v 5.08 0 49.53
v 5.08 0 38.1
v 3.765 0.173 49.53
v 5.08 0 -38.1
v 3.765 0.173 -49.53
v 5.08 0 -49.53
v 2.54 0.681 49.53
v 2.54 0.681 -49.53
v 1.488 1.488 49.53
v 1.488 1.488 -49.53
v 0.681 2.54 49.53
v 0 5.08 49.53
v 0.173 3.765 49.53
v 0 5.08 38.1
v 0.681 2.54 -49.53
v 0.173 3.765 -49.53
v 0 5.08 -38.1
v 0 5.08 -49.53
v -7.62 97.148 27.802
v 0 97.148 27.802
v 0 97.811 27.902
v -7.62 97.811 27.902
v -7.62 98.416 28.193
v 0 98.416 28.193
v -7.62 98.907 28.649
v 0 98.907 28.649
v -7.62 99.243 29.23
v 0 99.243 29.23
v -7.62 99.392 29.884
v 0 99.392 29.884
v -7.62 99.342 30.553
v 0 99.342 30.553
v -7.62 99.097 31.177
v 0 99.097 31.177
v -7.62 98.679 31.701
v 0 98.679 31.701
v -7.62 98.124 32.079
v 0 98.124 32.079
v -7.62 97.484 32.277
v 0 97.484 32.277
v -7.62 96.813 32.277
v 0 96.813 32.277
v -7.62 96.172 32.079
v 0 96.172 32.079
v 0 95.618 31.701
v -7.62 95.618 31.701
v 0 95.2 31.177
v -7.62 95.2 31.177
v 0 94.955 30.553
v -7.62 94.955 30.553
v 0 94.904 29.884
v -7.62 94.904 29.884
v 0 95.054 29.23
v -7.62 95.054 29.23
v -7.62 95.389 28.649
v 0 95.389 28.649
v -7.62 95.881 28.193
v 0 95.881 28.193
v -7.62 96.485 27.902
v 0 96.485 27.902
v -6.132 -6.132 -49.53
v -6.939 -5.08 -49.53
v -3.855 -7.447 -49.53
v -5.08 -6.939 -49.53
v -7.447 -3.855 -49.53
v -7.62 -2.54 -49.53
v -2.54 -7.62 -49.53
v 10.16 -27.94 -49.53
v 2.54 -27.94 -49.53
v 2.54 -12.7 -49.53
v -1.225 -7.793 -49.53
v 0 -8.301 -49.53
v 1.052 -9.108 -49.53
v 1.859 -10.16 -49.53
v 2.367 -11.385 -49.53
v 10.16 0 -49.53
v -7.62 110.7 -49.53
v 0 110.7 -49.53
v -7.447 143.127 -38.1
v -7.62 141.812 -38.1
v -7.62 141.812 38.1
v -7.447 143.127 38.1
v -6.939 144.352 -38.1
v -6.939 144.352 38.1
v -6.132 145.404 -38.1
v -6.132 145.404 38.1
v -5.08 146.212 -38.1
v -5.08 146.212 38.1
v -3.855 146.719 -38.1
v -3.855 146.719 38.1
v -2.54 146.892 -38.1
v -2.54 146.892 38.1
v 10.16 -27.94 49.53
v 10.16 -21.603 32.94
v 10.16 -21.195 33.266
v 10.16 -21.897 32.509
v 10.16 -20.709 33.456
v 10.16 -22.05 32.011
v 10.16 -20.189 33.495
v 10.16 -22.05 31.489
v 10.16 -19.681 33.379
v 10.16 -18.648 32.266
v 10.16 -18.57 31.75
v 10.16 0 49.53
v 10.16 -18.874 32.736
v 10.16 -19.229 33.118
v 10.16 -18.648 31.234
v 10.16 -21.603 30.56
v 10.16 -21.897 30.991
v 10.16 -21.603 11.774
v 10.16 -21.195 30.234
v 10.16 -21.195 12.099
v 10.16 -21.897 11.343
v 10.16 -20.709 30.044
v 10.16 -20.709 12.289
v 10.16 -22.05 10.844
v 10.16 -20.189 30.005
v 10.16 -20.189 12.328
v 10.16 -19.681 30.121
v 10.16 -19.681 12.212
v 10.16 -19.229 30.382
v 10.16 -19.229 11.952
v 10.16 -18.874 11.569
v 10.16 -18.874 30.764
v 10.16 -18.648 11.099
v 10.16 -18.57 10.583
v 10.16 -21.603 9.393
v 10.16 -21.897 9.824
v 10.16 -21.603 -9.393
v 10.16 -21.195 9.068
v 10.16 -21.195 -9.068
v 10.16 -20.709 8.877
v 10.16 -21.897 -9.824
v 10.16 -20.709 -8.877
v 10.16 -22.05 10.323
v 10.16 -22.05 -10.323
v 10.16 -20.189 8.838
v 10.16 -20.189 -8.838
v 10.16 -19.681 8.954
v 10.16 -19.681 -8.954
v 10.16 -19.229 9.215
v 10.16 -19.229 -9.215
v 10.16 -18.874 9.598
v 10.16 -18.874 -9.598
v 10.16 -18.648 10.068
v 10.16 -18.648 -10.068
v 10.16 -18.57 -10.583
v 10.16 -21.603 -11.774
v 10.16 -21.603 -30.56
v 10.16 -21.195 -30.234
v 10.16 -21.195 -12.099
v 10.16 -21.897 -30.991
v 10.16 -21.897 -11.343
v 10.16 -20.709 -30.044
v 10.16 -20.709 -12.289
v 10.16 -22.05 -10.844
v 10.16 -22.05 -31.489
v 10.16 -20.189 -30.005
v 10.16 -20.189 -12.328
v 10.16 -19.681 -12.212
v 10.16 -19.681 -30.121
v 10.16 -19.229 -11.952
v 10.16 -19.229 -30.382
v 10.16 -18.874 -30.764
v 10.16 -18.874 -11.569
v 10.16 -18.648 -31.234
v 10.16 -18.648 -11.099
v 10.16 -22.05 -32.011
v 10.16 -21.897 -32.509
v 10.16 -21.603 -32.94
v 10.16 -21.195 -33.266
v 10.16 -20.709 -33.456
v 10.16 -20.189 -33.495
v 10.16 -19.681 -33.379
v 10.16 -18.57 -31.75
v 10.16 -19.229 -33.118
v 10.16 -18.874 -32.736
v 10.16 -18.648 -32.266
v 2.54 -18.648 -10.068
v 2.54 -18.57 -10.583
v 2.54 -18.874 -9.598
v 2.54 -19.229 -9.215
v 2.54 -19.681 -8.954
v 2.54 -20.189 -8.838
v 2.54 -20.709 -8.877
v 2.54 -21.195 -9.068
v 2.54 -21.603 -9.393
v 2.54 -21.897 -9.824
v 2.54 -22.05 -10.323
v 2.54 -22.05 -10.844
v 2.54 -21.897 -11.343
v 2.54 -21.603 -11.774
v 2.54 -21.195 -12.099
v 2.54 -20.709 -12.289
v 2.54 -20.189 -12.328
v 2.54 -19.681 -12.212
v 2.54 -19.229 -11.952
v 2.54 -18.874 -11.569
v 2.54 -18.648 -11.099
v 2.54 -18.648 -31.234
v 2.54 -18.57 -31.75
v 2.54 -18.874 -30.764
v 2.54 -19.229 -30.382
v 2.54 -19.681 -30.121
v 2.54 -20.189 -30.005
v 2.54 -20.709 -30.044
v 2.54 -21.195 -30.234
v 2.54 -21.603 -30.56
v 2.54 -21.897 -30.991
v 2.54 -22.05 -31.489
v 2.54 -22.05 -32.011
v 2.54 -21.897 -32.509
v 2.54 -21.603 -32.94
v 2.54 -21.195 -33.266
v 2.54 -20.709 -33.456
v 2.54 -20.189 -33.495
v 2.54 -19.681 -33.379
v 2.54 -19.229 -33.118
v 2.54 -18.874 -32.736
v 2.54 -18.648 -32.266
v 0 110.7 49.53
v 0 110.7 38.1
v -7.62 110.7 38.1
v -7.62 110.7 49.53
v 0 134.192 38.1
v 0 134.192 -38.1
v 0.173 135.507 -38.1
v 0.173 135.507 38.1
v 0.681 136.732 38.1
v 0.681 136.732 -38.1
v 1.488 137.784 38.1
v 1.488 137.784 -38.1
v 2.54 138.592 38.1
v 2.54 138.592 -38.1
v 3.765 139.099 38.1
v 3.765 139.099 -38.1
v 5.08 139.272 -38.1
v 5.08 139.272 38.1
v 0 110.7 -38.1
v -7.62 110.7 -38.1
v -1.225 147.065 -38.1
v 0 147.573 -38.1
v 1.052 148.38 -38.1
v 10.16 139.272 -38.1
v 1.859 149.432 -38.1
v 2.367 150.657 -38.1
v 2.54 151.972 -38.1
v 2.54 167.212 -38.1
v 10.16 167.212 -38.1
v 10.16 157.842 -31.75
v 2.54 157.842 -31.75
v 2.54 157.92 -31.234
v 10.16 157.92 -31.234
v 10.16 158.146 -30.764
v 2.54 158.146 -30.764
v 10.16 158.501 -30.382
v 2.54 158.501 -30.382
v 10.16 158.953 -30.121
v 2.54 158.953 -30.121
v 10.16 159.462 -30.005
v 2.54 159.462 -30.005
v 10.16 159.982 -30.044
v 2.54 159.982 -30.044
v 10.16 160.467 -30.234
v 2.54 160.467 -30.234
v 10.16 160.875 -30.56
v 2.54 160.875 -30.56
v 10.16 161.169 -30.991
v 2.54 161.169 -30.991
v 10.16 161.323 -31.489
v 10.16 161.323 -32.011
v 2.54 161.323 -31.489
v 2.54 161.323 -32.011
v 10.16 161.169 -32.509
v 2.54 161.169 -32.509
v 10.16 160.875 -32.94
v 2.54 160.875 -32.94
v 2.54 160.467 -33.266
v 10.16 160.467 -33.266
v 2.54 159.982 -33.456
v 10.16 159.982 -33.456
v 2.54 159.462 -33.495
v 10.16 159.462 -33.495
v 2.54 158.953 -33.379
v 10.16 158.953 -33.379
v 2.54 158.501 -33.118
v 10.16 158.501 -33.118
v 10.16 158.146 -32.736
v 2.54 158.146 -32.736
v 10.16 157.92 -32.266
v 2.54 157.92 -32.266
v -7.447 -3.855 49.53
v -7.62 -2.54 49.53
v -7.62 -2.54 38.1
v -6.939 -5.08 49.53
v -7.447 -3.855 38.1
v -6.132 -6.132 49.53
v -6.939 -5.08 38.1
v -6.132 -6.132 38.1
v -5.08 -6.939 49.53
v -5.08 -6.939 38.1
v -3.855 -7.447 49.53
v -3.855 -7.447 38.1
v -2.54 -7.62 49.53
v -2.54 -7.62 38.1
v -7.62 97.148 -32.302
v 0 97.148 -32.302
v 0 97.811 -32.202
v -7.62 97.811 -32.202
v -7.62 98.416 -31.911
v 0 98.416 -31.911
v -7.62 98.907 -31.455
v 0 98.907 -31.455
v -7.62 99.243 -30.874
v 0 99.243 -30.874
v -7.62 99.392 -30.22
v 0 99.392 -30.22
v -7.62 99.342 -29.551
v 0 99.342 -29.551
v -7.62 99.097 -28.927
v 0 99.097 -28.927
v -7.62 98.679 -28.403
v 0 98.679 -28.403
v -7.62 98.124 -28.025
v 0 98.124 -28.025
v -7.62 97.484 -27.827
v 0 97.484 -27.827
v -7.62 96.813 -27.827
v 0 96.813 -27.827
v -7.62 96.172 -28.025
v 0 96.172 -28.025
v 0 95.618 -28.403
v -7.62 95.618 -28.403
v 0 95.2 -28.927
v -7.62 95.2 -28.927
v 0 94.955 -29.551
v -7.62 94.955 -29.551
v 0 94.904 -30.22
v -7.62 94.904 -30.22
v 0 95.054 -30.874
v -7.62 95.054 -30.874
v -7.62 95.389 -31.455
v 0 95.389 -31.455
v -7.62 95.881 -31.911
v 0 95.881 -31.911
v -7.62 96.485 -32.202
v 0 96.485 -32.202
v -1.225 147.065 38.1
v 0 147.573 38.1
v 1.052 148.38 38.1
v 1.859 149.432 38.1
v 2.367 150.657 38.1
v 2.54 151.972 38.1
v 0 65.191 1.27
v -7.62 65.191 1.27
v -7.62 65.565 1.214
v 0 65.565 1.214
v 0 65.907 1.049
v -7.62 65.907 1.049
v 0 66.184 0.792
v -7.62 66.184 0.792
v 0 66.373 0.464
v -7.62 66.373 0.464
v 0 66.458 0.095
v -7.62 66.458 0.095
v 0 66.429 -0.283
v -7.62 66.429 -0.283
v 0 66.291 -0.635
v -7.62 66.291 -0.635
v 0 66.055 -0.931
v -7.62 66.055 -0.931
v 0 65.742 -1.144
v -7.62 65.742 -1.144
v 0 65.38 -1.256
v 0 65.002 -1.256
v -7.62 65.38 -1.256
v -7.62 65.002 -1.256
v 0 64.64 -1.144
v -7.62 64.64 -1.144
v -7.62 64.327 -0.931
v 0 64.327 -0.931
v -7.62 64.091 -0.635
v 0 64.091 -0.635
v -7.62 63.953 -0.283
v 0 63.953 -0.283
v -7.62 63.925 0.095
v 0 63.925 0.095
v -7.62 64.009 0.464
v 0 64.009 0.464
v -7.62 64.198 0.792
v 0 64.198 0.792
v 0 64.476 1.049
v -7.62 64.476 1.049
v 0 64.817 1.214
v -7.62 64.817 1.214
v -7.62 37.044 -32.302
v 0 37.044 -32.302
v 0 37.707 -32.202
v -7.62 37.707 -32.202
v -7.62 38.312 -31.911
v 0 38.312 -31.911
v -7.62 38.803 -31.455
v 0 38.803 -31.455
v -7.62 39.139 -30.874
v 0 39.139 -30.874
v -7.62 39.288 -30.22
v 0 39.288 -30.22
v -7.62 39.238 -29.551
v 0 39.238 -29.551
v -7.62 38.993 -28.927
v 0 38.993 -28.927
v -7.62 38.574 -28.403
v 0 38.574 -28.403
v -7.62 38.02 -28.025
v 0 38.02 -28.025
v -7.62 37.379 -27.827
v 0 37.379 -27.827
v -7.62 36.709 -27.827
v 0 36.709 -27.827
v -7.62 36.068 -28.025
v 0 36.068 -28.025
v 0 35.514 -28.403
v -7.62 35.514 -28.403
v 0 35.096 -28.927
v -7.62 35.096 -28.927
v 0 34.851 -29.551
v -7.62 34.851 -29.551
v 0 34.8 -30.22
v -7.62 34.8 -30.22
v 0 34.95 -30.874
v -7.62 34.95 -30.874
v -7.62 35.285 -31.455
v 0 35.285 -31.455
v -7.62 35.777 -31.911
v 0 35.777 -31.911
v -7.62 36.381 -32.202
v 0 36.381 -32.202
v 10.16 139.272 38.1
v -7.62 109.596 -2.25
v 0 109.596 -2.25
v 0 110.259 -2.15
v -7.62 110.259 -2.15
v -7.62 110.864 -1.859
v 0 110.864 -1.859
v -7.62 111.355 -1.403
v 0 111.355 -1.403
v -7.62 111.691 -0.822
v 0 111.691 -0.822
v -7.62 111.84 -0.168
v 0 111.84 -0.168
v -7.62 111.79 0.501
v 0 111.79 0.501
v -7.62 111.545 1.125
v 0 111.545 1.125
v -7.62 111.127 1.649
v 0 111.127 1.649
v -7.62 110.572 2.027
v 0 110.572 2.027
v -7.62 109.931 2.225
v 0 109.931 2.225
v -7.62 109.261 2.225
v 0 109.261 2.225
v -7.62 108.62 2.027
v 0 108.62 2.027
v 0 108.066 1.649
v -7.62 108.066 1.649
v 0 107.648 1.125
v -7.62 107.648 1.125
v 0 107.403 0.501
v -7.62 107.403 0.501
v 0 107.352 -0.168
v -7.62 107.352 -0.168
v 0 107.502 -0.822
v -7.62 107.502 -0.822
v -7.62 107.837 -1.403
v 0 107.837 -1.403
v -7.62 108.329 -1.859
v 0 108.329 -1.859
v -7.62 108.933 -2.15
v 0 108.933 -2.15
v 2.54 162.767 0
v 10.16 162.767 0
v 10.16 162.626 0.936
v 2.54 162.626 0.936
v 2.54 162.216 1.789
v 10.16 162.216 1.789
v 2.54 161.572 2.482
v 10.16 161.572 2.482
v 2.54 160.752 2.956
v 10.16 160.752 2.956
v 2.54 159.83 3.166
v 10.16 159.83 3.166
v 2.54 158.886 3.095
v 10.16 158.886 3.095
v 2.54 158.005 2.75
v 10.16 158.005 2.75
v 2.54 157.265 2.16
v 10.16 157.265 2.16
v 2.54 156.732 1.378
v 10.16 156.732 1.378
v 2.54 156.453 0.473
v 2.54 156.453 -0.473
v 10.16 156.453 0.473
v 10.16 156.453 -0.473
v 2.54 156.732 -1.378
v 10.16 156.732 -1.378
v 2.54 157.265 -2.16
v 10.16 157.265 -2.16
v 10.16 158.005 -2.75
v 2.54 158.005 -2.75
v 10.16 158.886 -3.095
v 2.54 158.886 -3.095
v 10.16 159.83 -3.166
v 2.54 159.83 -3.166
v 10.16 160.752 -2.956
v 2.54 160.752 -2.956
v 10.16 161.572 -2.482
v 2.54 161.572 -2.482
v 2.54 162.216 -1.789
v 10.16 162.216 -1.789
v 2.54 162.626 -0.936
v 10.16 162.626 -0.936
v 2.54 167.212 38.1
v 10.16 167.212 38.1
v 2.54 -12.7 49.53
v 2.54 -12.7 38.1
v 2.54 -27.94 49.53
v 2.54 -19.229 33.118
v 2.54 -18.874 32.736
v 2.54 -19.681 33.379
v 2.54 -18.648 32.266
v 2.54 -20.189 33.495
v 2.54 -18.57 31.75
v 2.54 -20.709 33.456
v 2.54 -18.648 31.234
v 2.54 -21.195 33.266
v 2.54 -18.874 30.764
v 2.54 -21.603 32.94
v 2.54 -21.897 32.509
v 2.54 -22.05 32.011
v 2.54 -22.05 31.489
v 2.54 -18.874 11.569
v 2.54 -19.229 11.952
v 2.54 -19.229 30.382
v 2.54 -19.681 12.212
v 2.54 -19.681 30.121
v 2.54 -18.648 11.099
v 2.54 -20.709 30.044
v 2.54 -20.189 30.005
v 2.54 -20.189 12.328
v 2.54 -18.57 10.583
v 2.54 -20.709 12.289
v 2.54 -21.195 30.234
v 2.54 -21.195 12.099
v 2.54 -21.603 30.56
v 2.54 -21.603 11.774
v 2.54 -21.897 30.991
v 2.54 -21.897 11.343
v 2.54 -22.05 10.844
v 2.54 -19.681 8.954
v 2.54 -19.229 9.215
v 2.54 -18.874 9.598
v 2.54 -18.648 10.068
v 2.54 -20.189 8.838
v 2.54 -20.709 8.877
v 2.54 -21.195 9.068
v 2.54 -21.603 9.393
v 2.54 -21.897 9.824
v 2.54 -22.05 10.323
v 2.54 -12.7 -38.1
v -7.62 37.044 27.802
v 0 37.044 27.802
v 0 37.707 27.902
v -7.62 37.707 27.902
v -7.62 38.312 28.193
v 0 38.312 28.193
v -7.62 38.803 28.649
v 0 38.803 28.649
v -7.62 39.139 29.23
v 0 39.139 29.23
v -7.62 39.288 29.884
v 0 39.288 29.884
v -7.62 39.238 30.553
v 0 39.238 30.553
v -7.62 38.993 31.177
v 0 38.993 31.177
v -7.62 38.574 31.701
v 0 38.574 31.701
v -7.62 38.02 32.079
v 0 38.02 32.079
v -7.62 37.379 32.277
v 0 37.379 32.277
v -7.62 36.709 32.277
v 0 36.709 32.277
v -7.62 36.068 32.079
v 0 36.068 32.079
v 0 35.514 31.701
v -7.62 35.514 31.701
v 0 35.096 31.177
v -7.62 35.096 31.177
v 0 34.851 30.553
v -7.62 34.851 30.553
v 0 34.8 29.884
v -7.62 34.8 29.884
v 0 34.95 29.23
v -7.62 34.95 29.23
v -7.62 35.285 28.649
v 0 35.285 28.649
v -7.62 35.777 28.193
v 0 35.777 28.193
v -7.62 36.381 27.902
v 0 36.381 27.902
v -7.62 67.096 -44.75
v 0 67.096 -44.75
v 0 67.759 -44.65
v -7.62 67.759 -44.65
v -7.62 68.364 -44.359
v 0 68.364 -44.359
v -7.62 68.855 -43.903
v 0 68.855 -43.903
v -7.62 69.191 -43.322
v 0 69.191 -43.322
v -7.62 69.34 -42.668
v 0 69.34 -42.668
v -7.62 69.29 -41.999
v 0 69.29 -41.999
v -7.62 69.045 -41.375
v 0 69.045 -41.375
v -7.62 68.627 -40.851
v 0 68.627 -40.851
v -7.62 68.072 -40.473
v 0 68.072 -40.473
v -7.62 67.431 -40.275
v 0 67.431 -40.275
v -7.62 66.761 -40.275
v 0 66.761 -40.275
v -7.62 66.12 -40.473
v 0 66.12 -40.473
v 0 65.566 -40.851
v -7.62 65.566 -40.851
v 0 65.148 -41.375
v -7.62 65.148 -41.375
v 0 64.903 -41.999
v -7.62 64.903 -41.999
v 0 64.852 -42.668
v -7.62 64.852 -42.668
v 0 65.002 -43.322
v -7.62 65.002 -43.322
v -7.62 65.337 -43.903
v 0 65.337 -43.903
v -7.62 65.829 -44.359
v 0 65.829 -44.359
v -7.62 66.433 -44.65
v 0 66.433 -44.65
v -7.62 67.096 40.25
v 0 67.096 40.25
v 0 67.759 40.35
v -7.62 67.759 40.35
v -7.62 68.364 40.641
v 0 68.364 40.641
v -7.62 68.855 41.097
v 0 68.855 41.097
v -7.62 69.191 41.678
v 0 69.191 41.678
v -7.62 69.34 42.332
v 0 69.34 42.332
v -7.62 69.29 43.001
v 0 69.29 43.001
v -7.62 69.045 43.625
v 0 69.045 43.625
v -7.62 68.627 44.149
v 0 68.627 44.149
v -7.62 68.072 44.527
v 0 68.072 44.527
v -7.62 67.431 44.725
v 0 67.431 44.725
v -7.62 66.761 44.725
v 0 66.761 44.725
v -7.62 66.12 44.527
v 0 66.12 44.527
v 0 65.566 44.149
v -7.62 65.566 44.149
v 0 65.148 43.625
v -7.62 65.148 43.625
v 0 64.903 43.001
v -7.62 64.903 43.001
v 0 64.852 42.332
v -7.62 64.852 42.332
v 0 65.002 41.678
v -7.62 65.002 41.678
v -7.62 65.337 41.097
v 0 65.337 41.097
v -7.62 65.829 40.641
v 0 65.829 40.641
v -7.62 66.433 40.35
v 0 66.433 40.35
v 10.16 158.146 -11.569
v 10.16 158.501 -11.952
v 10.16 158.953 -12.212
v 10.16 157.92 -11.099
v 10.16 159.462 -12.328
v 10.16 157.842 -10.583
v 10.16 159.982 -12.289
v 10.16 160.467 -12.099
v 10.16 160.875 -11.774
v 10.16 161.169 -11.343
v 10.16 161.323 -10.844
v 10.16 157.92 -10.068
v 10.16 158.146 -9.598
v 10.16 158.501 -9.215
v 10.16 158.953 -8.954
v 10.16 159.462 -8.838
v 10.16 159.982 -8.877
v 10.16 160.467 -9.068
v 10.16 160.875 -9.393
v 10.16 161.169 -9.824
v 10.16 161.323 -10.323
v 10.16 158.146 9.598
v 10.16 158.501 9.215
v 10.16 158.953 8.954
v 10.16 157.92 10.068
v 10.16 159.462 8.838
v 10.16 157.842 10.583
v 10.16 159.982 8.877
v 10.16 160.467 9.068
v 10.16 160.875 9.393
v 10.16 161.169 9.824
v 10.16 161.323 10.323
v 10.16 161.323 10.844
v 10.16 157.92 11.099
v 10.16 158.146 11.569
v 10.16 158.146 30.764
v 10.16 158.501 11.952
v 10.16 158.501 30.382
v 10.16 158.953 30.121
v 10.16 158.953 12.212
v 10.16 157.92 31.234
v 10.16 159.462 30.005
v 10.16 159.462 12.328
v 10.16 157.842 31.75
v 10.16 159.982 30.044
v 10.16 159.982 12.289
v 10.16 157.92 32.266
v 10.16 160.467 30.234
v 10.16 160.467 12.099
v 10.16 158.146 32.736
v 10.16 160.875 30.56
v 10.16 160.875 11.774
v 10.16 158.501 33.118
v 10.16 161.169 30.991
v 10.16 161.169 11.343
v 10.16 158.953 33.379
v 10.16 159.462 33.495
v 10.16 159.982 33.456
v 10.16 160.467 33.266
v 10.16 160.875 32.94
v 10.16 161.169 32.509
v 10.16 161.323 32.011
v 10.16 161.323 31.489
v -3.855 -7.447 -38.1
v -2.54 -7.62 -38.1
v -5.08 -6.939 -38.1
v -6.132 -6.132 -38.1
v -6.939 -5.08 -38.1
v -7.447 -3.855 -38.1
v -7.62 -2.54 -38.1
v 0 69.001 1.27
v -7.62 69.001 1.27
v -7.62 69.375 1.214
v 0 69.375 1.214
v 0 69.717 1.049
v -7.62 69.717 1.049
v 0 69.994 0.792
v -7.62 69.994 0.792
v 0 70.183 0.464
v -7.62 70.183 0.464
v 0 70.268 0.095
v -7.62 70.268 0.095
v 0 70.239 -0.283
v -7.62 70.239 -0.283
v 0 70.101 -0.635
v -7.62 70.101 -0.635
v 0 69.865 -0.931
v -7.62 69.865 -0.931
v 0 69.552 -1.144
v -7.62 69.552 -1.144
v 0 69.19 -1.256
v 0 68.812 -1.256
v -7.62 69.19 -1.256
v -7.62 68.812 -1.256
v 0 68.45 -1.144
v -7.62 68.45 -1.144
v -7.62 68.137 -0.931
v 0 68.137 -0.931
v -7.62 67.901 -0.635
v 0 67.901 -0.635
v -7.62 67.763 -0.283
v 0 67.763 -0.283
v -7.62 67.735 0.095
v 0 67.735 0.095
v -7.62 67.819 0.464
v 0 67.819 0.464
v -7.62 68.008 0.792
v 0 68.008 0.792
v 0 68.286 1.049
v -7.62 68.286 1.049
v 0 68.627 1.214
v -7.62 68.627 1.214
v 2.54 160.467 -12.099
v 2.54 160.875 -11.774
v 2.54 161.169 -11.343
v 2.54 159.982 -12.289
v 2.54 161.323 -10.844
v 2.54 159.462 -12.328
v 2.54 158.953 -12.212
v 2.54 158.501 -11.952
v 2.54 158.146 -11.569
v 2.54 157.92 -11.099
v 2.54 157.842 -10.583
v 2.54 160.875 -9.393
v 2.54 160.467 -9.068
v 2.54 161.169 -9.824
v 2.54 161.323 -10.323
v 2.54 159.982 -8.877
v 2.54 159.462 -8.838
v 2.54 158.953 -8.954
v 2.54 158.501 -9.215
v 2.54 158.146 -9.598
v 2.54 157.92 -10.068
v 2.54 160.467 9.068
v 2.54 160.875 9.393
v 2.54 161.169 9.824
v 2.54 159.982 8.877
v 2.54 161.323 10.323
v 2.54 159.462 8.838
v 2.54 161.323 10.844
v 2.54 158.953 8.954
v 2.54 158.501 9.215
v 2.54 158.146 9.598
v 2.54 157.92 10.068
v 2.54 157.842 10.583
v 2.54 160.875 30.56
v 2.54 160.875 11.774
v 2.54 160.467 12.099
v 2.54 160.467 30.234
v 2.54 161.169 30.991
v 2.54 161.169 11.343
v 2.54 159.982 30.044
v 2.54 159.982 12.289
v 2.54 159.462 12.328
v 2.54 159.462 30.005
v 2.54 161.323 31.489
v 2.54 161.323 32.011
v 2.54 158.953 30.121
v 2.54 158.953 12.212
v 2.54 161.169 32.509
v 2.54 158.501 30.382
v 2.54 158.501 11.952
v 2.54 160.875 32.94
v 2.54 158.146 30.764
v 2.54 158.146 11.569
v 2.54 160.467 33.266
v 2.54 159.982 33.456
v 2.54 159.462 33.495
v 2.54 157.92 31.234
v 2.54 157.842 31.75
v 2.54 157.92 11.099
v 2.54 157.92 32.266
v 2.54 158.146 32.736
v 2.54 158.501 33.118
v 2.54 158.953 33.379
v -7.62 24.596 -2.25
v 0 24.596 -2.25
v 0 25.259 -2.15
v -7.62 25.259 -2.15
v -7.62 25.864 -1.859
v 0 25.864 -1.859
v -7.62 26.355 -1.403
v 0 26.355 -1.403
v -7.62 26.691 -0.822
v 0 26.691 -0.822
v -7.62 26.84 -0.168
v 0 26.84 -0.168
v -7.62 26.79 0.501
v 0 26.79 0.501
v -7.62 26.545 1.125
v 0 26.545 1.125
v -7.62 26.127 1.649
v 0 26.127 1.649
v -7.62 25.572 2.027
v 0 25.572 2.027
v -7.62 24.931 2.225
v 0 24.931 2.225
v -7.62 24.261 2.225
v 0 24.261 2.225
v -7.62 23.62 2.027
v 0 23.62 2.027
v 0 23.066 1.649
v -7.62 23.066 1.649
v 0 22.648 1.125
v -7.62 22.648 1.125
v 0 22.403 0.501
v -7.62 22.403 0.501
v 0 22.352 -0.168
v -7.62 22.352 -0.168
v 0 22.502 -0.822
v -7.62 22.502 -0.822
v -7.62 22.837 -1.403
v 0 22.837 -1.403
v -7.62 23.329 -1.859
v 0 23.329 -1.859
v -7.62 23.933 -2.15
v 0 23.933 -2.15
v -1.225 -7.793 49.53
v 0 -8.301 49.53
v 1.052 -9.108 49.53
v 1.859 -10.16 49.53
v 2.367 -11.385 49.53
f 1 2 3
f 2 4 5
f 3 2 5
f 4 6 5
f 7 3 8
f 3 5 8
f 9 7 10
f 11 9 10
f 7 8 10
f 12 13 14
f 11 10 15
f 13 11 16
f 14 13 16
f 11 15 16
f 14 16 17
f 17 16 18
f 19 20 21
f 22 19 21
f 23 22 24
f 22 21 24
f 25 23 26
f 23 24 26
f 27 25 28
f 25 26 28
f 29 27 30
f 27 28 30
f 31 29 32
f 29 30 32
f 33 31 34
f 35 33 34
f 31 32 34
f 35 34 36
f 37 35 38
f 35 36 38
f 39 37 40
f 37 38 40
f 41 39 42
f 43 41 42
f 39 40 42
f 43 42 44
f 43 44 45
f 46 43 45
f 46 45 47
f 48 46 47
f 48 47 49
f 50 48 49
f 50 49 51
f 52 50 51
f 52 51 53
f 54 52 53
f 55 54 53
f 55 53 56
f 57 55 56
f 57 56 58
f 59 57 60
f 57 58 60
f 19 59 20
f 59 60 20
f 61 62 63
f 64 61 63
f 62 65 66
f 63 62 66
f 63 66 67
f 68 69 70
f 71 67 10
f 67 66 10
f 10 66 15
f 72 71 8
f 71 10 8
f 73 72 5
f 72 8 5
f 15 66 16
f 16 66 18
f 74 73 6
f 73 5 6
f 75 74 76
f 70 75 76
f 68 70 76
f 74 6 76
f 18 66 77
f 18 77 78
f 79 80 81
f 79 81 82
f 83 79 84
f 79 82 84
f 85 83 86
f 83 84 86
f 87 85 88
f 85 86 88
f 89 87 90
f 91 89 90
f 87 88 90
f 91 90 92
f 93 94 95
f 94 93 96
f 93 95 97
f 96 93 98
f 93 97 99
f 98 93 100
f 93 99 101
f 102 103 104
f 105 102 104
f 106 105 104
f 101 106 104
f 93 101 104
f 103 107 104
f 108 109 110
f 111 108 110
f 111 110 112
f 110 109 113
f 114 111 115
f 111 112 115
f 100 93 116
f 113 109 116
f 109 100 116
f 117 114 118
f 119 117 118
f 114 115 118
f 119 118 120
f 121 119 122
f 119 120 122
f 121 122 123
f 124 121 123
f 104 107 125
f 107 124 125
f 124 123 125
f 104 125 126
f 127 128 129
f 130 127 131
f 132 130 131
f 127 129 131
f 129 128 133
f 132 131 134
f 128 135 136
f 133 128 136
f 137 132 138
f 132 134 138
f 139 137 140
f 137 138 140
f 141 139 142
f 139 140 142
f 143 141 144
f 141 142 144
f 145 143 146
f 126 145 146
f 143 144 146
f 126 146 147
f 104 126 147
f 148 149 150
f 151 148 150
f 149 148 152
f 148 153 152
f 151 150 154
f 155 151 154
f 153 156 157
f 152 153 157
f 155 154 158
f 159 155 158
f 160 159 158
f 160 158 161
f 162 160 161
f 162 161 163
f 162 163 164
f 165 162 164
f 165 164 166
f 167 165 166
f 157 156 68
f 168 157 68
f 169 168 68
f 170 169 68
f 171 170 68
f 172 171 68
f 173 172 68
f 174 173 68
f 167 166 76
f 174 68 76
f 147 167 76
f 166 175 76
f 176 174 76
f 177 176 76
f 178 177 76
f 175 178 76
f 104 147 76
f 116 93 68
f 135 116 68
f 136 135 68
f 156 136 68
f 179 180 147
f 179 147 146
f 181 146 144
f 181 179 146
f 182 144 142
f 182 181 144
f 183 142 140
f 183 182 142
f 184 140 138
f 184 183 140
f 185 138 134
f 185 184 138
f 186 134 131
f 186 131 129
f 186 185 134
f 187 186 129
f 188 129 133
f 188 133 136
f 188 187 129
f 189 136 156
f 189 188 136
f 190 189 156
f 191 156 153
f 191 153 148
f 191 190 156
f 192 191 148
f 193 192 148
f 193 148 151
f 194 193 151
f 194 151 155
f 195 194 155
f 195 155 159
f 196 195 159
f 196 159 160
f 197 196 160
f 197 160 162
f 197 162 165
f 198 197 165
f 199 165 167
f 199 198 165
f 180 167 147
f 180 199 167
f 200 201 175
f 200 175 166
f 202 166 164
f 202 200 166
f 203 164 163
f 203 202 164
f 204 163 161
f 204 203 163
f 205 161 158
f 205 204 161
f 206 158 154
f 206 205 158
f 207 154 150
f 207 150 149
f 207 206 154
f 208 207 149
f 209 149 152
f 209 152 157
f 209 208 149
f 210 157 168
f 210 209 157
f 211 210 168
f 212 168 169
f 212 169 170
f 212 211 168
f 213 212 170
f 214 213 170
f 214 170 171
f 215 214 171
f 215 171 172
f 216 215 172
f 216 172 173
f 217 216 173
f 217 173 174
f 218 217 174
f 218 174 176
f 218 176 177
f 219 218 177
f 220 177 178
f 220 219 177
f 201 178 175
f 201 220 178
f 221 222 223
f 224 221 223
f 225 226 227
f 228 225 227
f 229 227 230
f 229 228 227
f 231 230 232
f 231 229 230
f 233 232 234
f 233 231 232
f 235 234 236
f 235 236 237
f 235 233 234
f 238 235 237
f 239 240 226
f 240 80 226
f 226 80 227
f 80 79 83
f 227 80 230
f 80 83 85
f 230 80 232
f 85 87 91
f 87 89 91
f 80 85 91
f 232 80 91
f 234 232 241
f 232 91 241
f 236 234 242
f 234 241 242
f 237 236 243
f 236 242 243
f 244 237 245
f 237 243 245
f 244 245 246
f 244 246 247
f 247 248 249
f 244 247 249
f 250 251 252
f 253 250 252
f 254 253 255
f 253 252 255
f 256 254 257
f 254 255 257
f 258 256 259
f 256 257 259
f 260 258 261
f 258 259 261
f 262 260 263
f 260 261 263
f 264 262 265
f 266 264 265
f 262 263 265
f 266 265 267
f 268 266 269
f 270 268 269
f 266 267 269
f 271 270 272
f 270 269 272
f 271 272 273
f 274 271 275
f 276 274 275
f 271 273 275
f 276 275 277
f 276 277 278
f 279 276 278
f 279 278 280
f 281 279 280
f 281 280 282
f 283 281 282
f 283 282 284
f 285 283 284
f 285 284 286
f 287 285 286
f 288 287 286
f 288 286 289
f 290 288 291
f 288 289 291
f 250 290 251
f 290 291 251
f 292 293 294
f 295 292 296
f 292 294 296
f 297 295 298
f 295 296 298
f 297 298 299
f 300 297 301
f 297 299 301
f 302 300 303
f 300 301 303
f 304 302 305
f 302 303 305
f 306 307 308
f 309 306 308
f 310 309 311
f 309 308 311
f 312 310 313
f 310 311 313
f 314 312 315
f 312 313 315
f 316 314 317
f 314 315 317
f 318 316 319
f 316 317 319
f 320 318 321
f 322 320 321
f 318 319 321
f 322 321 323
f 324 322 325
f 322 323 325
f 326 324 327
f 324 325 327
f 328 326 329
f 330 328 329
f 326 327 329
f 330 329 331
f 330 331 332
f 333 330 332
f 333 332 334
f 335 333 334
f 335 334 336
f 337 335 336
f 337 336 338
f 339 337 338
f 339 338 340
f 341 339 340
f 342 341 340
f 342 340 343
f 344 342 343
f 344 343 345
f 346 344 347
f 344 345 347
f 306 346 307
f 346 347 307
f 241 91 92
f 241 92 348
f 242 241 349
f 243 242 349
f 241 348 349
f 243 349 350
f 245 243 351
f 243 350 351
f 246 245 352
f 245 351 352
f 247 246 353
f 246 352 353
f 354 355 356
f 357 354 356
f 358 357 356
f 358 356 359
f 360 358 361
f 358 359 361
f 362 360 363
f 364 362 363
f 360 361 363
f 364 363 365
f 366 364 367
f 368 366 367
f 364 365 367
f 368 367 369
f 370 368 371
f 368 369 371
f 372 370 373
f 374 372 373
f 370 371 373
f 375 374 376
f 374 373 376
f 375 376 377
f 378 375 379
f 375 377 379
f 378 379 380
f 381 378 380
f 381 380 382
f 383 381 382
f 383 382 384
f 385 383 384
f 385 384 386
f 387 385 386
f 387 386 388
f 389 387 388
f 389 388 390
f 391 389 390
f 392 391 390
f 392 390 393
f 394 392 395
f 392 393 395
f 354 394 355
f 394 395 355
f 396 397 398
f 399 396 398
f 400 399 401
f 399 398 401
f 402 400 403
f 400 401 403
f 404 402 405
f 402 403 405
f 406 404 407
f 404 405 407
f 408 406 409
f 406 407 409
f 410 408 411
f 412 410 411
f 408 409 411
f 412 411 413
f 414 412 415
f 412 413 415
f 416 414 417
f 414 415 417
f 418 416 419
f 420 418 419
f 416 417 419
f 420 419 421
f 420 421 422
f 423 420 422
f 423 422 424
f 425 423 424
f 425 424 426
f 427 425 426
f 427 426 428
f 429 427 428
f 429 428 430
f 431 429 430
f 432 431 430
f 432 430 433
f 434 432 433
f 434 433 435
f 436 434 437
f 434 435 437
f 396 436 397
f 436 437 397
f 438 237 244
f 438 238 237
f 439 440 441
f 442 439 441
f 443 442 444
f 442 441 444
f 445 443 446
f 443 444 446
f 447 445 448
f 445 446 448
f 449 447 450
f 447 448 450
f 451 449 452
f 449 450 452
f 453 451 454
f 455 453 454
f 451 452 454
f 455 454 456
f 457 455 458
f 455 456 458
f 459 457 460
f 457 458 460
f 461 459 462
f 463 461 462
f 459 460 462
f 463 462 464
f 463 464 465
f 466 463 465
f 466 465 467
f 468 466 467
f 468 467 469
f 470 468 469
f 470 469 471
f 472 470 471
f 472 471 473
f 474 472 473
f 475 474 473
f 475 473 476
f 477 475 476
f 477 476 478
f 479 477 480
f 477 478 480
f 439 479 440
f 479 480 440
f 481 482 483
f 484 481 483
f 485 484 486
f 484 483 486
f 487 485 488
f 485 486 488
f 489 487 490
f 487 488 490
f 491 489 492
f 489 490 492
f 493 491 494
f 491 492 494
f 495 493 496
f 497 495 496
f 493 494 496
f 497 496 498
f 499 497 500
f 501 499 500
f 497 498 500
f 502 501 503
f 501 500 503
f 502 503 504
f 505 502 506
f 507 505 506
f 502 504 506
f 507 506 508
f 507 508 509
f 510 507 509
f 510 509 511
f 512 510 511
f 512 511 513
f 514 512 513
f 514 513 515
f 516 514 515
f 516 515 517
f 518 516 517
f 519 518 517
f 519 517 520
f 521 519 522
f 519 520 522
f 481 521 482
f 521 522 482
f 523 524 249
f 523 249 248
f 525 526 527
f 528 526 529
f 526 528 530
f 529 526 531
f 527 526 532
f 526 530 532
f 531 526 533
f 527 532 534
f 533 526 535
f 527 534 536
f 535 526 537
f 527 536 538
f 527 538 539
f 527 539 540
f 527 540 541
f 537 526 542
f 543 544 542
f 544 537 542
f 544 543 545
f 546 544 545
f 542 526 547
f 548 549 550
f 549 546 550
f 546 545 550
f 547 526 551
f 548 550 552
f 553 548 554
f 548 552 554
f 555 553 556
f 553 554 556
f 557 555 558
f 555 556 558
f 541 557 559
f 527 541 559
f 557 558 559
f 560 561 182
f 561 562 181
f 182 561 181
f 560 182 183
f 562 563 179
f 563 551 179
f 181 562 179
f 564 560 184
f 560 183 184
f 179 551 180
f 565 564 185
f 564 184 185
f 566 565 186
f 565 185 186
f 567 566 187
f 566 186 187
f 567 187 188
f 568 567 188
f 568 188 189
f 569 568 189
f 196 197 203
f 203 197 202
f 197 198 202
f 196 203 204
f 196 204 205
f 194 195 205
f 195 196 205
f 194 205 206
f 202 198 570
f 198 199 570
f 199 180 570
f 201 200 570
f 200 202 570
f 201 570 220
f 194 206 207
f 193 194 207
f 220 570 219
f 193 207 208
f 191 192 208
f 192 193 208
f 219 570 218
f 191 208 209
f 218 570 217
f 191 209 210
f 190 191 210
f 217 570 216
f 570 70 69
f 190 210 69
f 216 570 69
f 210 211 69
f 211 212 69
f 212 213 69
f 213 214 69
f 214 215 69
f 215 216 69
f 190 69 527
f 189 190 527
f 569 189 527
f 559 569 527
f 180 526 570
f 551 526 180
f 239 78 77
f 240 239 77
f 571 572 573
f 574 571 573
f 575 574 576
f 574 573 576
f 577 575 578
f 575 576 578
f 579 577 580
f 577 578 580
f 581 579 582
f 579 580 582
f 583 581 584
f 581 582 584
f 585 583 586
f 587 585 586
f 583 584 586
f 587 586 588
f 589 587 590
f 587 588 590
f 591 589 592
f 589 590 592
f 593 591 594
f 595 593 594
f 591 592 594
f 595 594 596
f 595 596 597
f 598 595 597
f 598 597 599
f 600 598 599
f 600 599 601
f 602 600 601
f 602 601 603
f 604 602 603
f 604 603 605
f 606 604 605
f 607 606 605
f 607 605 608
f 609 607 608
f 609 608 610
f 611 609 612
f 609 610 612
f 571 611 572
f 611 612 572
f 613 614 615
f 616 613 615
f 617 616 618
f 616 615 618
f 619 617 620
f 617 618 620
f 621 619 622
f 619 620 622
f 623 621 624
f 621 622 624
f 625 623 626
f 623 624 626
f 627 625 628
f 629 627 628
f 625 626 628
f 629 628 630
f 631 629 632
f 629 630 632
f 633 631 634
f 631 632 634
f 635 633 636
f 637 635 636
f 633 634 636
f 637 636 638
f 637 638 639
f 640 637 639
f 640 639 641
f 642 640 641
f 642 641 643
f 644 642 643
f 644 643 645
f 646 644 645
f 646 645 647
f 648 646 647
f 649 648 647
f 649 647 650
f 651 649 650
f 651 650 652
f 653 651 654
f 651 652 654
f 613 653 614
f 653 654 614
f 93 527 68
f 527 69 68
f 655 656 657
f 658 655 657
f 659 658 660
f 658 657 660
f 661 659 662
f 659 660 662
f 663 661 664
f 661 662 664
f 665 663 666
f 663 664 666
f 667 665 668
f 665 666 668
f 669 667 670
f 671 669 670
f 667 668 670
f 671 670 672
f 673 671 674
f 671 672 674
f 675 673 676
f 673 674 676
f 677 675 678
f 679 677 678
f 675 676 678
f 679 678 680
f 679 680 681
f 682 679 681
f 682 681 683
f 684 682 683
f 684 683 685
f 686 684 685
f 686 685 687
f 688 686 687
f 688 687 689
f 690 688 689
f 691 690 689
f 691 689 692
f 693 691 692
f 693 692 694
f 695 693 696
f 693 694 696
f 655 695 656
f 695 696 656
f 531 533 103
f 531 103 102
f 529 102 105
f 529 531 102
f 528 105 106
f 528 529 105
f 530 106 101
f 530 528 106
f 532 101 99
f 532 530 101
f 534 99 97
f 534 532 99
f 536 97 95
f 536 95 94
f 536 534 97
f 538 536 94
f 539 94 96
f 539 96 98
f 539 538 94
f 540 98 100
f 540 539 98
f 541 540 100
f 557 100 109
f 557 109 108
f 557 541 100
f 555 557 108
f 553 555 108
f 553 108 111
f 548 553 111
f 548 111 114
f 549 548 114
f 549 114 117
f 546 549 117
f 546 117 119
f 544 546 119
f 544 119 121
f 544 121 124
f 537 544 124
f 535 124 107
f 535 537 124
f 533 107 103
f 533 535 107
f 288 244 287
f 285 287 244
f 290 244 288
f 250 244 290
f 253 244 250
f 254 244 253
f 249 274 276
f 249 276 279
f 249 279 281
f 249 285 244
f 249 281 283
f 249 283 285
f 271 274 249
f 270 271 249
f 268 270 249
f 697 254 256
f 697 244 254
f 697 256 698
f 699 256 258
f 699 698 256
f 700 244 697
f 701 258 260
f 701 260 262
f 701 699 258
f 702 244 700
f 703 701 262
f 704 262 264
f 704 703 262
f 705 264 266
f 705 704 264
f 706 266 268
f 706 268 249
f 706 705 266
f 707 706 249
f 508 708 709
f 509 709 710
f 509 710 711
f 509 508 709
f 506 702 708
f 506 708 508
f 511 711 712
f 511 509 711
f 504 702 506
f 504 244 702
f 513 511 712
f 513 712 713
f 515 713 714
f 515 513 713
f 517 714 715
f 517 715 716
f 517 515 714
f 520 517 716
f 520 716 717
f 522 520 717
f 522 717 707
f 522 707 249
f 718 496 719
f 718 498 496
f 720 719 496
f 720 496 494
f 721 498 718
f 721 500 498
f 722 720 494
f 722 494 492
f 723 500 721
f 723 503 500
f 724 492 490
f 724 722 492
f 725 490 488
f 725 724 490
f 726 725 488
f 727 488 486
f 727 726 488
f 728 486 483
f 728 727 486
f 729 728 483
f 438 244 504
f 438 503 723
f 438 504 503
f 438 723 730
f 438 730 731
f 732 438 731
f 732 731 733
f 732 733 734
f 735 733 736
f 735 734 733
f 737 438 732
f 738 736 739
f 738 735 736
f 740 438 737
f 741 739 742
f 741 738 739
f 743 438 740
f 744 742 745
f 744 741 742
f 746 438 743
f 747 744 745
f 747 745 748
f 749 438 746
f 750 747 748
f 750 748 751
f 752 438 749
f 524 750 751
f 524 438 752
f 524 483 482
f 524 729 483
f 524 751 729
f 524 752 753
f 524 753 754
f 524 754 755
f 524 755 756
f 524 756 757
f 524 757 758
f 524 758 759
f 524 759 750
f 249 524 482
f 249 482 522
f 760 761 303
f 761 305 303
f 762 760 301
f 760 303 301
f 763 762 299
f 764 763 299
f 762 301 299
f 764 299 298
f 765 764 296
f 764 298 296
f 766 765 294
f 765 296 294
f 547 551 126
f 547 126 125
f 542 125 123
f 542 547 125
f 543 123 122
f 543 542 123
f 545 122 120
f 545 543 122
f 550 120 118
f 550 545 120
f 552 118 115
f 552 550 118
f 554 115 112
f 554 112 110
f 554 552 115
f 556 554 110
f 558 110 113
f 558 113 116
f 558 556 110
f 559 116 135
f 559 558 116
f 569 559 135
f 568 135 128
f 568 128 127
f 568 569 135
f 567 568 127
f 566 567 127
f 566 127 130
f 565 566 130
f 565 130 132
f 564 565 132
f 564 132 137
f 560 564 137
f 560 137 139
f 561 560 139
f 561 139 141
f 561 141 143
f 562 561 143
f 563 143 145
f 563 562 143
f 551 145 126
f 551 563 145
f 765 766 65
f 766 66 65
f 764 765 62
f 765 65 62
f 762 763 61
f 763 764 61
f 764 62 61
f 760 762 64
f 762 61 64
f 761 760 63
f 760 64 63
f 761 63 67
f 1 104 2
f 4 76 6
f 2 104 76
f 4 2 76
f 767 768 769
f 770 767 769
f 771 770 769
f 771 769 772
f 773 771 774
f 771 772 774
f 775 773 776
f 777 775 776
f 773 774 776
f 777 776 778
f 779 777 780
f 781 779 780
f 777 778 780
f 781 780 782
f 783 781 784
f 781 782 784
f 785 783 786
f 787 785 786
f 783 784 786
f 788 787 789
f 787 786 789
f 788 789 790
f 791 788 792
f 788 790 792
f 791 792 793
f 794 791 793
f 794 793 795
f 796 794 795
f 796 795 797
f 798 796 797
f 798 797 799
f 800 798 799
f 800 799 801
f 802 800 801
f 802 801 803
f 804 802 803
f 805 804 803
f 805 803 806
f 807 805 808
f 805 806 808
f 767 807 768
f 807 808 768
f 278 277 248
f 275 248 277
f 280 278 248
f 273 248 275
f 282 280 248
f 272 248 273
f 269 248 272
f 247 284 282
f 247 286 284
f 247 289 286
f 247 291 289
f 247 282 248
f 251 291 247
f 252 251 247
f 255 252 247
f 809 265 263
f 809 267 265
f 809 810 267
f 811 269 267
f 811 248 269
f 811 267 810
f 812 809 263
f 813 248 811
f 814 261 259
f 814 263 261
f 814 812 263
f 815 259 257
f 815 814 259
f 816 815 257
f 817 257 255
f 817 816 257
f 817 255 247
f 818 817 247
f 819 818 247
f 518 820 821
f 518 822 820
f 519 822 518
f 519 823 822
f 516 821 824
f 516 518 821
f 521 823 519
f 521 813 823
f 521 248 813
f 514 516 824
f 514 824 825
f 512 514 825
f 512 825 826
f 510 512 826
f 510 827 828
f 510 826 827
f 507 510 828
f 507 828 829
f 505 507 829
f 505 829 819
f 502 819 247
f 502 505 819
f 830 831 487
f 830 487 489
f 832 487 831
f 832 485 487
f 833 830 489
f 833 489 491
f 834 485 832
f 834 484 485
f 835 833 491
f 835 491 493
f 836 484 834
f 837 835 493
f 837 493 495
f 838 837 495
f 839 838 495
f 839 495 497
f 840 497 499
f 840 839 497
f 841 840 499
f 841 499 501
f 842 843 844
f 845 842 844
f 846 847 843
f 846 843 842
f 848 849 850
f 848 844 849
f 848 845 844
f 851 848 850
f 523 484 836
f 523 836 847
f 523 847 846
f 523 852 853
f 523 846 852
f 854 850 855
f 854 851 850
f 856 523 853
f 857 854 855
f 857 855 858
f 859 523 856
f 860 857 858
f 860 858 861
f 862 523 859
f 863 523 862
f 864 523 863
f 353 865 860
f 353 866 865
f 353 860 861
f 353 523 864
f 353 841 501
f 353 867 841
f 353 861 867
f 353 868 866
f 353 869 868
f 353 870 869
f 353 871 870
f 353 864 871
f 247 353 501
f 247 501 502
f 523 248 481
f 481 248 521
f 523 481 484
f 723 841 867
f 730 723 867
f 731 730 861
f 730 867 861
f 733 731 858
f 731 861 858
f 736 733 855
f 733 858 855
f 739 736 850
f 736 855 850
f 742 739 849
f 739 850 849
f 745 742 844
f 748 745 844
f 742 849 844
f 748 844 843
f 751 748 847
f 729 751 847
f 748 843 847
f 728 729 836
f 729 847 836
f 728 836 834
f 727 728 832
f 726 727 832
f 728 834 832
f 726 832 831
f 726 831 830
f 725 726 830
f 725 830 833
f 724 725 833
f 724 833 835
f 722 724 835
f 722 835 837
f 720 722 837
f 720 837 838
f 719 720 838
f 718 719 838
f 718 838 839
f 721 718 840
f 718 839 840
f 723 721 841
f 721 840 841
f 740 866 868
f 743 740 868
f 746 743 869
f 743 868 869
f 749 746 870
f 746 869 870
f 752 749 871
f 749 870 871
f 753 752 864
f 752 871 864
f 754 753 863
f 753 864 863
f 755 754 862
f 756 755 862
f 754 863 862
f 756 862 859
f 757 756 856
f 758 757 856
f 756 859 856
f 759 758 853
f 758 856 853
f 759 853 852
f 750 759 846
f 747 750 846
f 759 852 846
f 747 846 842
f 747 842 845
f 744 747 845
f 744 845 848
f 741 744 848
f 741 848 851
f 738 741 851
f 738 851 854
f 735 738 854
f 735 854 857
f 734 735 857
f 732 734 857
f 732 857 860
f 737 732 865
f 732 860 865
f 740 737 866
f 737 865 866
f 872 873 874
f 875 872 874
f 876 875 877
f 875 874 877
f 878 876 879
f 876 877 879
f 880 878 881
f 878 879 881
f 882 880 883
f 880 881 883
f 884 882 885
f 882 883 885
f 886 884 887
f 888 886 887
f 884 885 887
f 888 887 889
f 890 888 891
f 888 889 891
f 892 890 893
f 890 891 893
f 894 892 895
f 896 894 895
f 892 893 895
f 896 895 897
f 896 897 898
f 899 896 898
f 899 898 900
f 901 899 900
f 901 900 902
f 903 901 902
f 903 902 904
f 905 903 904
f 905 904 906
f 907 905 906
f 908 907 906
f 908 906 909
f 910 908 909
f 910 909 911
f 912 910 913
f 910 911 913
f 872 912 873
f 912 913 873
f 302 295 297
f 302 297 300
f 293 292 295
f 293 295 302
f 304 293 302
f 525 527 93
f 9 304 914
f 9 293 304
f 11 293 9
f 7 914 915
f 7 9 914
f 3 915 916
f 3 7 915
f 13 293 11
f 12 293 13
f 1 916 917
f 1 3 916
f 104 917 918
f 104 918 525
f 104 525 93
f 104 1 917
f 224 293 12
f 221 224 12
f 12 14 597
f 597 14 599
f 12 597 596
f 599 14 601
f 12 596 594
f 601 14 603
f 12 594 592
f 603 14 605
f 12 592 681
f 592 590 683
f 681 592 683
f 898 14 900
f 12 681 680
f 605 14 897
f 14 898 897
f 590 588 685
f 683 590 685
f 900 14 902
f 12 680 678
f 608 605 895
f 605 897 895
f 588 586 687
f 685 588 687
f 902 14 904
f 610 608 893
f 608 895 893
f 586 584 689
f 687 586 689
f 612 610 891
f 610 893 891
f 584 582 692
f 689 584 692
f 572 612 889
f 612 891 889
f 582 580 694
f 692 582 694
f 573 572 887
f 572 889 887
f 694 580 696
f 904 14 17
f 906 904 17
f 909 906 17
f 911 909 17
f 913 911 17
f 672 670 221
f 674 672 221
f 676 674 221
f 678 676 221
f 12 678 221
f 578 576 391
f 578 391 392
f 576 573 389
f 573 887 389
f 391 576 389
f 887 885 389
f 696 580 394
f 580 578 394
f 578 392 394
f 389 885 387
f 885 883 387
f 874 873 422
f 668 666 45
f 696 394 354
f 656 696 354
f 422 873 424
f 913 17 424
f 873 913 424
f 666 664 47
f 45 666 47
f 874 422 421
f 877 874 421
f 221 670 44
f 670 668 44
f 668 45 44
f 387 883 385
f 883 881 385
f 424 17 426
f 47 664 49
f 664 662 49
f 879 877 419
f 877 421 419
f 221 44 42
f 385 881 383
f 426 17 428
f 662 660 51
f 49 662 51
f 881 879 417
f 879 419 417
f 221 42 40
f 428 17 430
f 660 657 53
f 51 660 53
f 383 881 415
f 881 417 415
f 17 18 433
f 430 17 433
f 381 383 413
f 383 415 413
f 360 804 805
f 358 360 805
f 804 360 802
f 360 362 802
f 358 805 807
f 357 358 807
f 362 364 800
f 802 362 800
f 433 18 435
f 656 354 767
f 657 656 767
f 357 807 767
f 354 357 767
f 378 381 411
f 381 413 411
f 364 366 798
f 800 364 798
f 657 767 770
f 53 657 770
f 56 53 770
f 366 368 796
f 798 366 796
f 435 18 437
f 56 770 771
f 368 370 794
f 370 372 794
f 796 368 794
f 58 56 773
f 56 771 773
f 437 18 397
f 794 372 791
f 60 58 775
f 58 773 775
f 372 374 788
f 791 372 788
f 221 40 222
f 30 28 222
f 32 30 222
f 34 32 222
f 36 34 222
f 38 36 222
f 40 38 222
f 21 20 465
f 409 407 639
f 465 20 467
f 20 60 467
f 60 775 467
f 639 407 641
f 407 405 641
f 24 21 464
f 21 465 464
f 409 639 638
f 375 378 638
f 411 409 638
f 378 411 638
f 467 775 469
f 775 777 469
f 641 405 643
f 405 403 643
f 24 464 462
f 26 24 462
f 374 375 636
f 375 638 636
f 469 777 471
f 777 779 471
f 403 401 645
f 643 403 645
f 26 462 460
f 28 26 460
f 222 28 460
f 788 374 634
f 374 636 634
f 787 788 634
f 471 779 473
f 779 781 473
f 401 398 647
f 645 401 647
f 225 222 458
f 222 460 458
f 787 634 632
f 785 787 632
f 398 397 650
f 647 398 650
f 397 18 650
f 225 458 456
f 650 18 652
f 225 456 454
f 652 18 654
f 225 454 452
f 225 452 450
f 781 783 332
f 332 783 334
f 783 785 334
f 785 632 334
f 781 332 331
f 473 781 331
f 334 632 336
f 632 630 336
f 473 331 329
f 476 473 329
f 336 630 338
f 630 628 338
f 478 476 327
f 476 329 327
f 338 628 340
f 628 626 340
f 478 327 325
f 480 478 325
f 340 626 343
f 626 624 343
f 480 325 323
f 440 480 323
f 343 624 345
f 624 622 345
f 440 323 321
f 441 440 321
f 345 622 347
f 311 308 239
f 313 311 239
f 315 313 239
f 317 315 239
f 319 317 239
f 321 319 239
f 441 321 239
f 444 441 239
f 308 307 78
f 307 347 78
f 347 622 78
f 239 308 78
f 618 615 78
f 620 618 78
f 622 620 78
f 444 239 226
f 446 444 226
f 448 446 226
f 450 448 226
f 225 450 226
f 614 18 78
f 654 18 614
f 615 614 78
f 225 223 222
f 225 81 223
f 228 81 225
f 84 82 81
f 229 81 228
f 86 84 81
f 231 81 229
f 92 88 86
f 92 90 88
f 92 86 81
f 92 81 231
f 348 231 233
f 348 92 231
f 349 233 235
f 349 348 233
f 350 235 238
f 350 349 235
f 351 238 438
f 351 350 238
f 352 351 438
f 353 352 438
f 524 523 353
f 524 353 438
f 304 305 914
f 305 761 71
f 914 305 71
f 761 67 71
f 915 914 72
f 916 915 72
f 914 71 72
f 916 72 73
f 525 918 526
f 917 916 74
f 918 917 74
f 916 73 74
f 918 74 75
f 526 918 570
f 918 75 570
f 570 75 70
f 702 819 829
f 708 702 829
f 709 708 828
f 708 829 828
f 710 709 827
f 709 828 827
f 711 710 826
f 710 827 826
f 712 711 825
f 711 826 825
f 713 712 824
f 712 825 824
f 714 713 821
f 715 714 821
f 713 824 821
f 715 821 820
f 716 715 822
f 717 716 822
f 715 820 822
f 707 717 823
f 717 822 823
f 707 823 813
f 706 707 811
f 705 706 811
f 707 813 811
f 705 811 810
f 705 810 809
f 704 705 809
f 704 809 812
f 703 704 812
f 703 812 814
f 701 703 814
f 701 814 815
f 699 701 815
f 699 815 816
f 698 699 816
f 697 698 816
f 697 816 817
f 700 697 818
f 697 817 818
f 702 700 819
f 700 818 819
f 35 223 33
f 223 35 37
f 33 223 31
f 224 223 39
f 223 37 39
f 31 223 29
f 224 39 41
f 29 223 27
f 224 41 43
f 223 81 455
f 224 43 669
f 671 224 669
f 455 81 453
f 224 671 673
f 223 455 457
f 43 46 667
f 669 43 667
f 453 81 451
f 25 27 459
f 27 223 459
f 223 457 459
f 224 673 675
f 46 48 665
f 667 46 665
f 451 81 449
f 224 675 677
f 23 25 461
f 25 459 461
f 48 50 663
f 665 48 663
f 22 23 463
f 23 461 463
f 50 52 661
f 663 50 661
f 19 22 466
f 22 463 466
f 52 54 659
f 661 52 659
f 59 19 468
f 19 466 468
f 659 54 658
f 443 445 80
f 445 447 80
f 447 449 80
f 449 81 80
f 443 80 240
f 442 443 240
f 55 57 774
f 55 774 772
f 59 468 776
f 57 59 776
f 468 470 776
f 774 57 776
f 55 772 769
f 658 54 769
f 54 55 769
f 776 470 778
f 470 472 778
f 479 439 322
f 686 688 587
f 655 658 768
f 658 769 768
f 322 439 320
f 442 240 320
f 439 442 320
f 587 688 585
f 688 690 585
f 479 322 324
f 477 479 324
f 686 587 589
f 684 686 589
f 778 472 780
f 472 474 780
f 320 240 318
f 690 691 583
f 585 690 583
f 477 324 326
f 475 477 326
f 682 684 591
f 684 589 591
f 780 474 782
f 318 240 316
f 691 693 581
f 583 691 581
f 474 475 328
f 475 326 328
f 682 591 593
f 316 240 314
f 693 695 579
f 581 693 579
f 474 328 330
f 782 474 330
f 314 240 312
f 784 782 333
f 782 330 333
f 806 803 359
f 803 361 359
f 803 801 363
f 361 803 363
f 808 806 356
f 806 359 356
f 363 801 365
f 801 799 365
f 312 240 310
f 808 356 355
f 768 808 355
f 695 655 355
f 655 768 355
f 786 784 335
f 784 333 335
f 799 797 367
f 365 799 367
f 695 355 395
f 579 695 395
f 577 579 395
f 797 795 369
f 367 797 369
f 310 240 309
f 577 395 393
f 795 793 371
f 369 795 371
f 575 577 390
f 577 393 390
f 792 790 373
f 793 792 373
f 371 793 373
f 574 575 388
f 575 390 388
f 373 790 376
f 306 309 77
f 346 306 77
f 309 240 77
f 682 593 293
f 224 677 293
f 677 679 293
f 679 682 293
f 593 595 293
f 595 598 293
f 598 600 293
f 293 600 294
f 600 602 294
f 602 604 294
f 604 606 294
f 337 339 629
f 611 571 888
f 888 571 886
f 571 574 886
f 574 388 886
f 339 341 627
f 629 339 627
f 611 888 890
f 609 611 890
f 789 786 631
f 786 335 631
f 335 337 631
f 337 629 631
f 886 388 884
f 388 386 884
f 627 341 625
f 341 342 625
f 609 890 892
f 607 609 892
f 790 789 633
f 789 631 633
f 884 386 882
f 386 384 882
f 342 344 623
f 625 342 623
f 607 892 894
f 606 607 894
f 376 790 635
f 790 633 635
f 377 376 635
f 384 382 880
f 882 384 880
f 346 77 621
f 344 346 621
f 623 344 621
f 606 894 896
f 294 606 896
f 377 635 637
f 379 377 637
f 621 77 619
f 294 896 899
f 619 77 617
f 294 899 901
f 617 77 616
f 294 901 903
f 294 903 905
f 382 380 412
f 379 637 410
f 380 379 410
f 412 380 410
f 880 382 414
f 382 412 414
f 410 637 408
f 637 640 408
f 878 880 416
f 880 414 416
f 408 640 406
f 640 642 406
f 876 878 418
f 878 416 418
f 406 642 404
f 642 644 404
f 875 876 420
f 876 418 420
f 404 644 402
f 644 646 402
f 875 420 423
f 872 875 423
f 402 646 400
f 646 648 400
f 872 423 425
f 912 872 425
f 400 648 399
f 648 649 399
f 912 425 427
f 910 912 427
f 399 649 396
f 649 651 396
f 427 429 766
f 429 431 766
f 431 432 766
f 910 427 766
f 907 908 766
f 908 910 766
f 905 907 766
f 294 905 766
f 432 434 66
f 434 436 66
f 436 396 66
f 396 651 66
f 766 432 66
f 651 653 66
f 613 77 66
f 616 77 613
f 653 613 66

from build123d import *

# Parameters (mm, degrees)
BOSS_EXTRUDE1_DEPTH = 38.1
FILLET1_R           = 5.08
BOSS_EXTRUDE2_DEPTH = 49.53
SKETCH7_R           = 2.25
CUT_EXTRUDE1_DEPTH  = 7.62
SKETCH8_R           = 1.75
CUT_EXTRUDE2_DEPTH  = 7.62
SKETCH10_R          = 3.175
CGTEST1_DEPTH       = 7.62
SKETCH11_R          = 1.27
CUT_EXTRUDE4_DEPTH  = 7.62


with BuildPart() as part:
    # Sketch1 → Boss-Extrude1 (new, symmetric)
    with BuildSketch(Plane.XY):
        Polygon((0, 0), (0, 139.272298857), (10.16, 139.272298857), (10.16, 146.892298857), (10.16, 167.212298857), (2.54, 167.212298857), (2.54, 146.892298857), (-7.62, 146.892298857), (-7.62, 139.272298857), (-7.62, -7.62), (2.54, -7.62), (2.54, -27.94), (10.16, -27.94), (10.16, -7.62), (10.16, 0), align=None)
    extrude(amount=BOSS_EXTRUDE1_DEPTH, both=True)

    # Fillet1
    fillet1_edges = [part.edges().sort_by_distance(p)[0] for p in [
        (0, 0, 0),
        (2.54, -7.62, 0),
        (0, 139.272298857, 0),
        (2.54, 146.892298857, 0),
        (-7.62, 146.892298857, 0),
        (-7.62, -7.62, 0),
    ]]
    fillet(fillet1_edges, radius=FILLET1_R - 0.0001)  # a hair under: the kernel refuses the full size

    # Sketch3 → Boss-Extrude2 (add, symmetric)
    with BuildSketch(Plane(origin=(0, 0, 0), x_dir=(-1, 0, 0), z_dir=(0, 0, -1))):
        with BuildLine():
            Line((0, 110.7), (7.62, 110.7))
            Line((7.62, 110.7), (7.62, -2.54))
            ThreePointArc((7.62, -2.54), (6.132102448, -6.132102448), (2.54, -7.62))
            ThreePointArc((2.54, -7.62), (-1.052102448, -9.107897552), (-2.54, -12.7))
            Line((-2.54, -12.7), (-2.54, -27.94))
            Line((-2.54, -27.94), (-10.16, -27.94))
            Line((-10.16, -27.94), (-10.16, 0))
            Line((-10.16, 0), (-5.08, 0))
            ThreePointArc((-5.08, 0), (-1.487897552, 1.487897552), (0, 5.08))
            Line((0, 5.08), (0, 110.7))
        make_face()
    extrude(amount=BOSS_EXTRUDE2_DEPTH, both=True)

    # Sketch7 → Cut-Extrude1 (cut)
    with BuildSketch(Plane(origin=(0, 0, 0), x_dir=(0, 0, -1), z_dir=(1, 0, 0))):
        with Locations((-42.5, 67.096149428)):
            Circle(SKETCH7_R)
        with Locations((-30.0520382, 97.148187629)):
            Circle(SKETCH7_R)
        with Locations((0, 109.596149428)):
            Circle(SKETCH7_R)
        with Locations((30.0520382, 97.148187629)):
            Circle(SKETCH7_R)
        with Locations((42.5, 67.096149428)):
            Circle(SKETCH7_R)
        with Locations((30.0520382, 37.044111228)):
            Circle(SKETCH7_R)
        with Locations((0, 24.596149428)):
            Circle(SKETCH7_R)
        with Locations((-30.0520382, 37.044111228)):
            Circle(SKETCH7_R)
    extrude(amount=-CUT_EXTRUDE1_DEPTH, mode=Mode.SUBTRACT)

    # Sketch8 → Cut-Extrude2 (cut)
    with BuildSketch(Plane.ZY.offset(-2.54)):
        with Locations(Location((-31.75, 159.592298857, 0), (0, 0, 270))):
            Circle(SKETCH8_R)
        with Locations(Location((-10.583333333, 159.592298857, 0), (0, 0, 270))):
            Circle(SKETCH8_R)
        with Locations(Location((10.583333333, 159.592298857, 0), (0, 0, 270))):
            Circle(SKETCH8_R)
        with Locations(Location((31.75, 159.592298857, 0), (0, 0, 270))):
            Circle(SKETCH8_R)
    cut_extrude2 = extrude(amount=-CUT_EXTRUDE2_DEPTH, mode=Mode.SUBTRACT)

    # Mirror1: Cut-Extrude2 across plane
    add(cut_extrude2.mirror(Plane.ZX.offset(69.636149428)), mode=Mode.SUBTRACT)

    # Sketch10 → CGTest1 (cut)
    with BuildSketch(Plane(origin=(10.16, 0, 0), x_dir=(0, 0, -1), z_dir=(1, 0, 0))):
        with Locations(Location((0, 159.592298857, 0), (0, 0, 90))):
            Circle(SKETCH10_R)
    extrude(amount=-CGTEST1_DEPTH, mode=Mode.SUBTRACT)

    # Sketch11 → Cut-Extrude4 (cut)
    with BuildSketch(Plane.ZY.offset(7.62)):
        with Locations((0, 69.001149428)):
            Circle(SKETCH11_R)
        with Locations((0, 65.191149428)):
            Circle(SKETCH11_R)
    extrude(amount=-CUT_EXTRUDE4_DEPTH, mode=Mode.SUBTRACT)


solid = part.part
